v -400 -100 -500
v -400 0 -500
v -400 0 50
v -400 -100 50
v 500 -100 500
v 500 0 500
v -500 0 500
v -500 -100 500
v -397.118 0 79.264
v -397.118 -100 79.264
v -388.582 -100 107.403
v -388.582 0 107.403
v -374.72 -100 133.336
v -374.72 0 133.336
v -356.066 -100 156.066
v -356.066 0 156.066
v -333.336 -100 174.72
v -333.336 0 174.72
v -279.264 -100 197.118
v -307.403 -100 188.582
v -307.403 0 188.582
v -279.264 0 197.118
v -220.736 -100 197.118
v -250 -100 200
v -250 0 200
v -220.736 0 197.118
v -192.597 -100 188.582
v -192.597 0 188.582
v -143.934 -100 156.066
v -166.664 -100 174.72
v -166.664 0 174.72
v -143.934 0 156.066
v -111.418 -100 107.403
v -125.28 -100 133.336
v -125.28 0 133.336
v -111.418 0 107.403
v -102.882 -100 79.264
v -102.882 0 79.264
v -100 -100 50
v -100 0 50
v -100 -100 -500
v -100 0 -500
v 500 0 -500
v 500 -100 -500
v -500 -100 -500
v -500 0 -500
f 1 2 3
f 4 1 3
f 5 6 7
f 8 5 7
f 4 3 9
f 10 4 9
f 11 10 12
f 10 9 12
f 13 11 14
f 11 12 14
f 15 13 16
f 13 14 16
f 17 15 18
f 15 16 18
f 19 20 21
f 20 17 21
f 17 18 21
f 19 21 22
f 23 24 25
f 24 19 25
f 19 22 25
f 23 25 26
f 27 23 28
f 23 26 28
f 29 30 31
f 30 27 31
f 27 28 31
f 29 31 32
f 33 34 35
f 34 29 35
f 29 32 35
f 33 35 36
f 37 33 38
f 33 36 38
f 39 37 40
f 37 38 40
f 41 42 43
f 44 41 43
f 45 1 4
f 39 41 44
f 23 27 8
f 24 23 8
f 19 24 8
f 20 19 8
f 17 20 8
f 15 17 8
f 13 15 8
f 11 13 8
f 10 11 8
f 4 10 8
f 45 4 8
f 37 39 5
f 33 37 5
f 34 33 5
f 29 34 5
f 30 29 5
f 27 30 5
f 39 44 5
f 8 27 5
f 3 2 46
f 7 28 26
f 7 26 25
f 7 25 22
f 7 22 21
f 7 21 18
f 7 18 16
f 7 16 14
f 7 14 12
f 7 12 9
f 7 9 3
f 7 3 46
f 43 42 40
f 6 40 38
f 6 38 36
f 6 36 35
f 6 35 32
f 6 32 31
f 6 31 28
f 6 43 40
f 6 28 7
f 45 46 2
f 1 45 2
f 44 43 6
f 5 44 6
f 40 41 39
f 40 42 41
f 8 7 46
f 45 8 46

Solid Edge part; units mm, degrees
sketch "Sketch1" plane through (0, 0, 0) normal (0, -1, 0) x (1, 0, 0)
  arc A0 (-100, 50) -> (-400, 50) centre (-250, 50) ccw
  line L0 (-400, -500) -> (-400, 50)
  line L1 (-500, -500) -> (-400, -500)
  line L2 (-500, 500) -> (-500, -500)
  line L3 (500, 500) -> (-500, 500)
  line L4 (500, -500) -> (500, 500)
  line L5 (-100, -500) -> (500, -500)
  line L6 (-100, -500) -> (-100, 50)
extrude "Protrusion1" add sketch "Sketch1" along normal blind 100
